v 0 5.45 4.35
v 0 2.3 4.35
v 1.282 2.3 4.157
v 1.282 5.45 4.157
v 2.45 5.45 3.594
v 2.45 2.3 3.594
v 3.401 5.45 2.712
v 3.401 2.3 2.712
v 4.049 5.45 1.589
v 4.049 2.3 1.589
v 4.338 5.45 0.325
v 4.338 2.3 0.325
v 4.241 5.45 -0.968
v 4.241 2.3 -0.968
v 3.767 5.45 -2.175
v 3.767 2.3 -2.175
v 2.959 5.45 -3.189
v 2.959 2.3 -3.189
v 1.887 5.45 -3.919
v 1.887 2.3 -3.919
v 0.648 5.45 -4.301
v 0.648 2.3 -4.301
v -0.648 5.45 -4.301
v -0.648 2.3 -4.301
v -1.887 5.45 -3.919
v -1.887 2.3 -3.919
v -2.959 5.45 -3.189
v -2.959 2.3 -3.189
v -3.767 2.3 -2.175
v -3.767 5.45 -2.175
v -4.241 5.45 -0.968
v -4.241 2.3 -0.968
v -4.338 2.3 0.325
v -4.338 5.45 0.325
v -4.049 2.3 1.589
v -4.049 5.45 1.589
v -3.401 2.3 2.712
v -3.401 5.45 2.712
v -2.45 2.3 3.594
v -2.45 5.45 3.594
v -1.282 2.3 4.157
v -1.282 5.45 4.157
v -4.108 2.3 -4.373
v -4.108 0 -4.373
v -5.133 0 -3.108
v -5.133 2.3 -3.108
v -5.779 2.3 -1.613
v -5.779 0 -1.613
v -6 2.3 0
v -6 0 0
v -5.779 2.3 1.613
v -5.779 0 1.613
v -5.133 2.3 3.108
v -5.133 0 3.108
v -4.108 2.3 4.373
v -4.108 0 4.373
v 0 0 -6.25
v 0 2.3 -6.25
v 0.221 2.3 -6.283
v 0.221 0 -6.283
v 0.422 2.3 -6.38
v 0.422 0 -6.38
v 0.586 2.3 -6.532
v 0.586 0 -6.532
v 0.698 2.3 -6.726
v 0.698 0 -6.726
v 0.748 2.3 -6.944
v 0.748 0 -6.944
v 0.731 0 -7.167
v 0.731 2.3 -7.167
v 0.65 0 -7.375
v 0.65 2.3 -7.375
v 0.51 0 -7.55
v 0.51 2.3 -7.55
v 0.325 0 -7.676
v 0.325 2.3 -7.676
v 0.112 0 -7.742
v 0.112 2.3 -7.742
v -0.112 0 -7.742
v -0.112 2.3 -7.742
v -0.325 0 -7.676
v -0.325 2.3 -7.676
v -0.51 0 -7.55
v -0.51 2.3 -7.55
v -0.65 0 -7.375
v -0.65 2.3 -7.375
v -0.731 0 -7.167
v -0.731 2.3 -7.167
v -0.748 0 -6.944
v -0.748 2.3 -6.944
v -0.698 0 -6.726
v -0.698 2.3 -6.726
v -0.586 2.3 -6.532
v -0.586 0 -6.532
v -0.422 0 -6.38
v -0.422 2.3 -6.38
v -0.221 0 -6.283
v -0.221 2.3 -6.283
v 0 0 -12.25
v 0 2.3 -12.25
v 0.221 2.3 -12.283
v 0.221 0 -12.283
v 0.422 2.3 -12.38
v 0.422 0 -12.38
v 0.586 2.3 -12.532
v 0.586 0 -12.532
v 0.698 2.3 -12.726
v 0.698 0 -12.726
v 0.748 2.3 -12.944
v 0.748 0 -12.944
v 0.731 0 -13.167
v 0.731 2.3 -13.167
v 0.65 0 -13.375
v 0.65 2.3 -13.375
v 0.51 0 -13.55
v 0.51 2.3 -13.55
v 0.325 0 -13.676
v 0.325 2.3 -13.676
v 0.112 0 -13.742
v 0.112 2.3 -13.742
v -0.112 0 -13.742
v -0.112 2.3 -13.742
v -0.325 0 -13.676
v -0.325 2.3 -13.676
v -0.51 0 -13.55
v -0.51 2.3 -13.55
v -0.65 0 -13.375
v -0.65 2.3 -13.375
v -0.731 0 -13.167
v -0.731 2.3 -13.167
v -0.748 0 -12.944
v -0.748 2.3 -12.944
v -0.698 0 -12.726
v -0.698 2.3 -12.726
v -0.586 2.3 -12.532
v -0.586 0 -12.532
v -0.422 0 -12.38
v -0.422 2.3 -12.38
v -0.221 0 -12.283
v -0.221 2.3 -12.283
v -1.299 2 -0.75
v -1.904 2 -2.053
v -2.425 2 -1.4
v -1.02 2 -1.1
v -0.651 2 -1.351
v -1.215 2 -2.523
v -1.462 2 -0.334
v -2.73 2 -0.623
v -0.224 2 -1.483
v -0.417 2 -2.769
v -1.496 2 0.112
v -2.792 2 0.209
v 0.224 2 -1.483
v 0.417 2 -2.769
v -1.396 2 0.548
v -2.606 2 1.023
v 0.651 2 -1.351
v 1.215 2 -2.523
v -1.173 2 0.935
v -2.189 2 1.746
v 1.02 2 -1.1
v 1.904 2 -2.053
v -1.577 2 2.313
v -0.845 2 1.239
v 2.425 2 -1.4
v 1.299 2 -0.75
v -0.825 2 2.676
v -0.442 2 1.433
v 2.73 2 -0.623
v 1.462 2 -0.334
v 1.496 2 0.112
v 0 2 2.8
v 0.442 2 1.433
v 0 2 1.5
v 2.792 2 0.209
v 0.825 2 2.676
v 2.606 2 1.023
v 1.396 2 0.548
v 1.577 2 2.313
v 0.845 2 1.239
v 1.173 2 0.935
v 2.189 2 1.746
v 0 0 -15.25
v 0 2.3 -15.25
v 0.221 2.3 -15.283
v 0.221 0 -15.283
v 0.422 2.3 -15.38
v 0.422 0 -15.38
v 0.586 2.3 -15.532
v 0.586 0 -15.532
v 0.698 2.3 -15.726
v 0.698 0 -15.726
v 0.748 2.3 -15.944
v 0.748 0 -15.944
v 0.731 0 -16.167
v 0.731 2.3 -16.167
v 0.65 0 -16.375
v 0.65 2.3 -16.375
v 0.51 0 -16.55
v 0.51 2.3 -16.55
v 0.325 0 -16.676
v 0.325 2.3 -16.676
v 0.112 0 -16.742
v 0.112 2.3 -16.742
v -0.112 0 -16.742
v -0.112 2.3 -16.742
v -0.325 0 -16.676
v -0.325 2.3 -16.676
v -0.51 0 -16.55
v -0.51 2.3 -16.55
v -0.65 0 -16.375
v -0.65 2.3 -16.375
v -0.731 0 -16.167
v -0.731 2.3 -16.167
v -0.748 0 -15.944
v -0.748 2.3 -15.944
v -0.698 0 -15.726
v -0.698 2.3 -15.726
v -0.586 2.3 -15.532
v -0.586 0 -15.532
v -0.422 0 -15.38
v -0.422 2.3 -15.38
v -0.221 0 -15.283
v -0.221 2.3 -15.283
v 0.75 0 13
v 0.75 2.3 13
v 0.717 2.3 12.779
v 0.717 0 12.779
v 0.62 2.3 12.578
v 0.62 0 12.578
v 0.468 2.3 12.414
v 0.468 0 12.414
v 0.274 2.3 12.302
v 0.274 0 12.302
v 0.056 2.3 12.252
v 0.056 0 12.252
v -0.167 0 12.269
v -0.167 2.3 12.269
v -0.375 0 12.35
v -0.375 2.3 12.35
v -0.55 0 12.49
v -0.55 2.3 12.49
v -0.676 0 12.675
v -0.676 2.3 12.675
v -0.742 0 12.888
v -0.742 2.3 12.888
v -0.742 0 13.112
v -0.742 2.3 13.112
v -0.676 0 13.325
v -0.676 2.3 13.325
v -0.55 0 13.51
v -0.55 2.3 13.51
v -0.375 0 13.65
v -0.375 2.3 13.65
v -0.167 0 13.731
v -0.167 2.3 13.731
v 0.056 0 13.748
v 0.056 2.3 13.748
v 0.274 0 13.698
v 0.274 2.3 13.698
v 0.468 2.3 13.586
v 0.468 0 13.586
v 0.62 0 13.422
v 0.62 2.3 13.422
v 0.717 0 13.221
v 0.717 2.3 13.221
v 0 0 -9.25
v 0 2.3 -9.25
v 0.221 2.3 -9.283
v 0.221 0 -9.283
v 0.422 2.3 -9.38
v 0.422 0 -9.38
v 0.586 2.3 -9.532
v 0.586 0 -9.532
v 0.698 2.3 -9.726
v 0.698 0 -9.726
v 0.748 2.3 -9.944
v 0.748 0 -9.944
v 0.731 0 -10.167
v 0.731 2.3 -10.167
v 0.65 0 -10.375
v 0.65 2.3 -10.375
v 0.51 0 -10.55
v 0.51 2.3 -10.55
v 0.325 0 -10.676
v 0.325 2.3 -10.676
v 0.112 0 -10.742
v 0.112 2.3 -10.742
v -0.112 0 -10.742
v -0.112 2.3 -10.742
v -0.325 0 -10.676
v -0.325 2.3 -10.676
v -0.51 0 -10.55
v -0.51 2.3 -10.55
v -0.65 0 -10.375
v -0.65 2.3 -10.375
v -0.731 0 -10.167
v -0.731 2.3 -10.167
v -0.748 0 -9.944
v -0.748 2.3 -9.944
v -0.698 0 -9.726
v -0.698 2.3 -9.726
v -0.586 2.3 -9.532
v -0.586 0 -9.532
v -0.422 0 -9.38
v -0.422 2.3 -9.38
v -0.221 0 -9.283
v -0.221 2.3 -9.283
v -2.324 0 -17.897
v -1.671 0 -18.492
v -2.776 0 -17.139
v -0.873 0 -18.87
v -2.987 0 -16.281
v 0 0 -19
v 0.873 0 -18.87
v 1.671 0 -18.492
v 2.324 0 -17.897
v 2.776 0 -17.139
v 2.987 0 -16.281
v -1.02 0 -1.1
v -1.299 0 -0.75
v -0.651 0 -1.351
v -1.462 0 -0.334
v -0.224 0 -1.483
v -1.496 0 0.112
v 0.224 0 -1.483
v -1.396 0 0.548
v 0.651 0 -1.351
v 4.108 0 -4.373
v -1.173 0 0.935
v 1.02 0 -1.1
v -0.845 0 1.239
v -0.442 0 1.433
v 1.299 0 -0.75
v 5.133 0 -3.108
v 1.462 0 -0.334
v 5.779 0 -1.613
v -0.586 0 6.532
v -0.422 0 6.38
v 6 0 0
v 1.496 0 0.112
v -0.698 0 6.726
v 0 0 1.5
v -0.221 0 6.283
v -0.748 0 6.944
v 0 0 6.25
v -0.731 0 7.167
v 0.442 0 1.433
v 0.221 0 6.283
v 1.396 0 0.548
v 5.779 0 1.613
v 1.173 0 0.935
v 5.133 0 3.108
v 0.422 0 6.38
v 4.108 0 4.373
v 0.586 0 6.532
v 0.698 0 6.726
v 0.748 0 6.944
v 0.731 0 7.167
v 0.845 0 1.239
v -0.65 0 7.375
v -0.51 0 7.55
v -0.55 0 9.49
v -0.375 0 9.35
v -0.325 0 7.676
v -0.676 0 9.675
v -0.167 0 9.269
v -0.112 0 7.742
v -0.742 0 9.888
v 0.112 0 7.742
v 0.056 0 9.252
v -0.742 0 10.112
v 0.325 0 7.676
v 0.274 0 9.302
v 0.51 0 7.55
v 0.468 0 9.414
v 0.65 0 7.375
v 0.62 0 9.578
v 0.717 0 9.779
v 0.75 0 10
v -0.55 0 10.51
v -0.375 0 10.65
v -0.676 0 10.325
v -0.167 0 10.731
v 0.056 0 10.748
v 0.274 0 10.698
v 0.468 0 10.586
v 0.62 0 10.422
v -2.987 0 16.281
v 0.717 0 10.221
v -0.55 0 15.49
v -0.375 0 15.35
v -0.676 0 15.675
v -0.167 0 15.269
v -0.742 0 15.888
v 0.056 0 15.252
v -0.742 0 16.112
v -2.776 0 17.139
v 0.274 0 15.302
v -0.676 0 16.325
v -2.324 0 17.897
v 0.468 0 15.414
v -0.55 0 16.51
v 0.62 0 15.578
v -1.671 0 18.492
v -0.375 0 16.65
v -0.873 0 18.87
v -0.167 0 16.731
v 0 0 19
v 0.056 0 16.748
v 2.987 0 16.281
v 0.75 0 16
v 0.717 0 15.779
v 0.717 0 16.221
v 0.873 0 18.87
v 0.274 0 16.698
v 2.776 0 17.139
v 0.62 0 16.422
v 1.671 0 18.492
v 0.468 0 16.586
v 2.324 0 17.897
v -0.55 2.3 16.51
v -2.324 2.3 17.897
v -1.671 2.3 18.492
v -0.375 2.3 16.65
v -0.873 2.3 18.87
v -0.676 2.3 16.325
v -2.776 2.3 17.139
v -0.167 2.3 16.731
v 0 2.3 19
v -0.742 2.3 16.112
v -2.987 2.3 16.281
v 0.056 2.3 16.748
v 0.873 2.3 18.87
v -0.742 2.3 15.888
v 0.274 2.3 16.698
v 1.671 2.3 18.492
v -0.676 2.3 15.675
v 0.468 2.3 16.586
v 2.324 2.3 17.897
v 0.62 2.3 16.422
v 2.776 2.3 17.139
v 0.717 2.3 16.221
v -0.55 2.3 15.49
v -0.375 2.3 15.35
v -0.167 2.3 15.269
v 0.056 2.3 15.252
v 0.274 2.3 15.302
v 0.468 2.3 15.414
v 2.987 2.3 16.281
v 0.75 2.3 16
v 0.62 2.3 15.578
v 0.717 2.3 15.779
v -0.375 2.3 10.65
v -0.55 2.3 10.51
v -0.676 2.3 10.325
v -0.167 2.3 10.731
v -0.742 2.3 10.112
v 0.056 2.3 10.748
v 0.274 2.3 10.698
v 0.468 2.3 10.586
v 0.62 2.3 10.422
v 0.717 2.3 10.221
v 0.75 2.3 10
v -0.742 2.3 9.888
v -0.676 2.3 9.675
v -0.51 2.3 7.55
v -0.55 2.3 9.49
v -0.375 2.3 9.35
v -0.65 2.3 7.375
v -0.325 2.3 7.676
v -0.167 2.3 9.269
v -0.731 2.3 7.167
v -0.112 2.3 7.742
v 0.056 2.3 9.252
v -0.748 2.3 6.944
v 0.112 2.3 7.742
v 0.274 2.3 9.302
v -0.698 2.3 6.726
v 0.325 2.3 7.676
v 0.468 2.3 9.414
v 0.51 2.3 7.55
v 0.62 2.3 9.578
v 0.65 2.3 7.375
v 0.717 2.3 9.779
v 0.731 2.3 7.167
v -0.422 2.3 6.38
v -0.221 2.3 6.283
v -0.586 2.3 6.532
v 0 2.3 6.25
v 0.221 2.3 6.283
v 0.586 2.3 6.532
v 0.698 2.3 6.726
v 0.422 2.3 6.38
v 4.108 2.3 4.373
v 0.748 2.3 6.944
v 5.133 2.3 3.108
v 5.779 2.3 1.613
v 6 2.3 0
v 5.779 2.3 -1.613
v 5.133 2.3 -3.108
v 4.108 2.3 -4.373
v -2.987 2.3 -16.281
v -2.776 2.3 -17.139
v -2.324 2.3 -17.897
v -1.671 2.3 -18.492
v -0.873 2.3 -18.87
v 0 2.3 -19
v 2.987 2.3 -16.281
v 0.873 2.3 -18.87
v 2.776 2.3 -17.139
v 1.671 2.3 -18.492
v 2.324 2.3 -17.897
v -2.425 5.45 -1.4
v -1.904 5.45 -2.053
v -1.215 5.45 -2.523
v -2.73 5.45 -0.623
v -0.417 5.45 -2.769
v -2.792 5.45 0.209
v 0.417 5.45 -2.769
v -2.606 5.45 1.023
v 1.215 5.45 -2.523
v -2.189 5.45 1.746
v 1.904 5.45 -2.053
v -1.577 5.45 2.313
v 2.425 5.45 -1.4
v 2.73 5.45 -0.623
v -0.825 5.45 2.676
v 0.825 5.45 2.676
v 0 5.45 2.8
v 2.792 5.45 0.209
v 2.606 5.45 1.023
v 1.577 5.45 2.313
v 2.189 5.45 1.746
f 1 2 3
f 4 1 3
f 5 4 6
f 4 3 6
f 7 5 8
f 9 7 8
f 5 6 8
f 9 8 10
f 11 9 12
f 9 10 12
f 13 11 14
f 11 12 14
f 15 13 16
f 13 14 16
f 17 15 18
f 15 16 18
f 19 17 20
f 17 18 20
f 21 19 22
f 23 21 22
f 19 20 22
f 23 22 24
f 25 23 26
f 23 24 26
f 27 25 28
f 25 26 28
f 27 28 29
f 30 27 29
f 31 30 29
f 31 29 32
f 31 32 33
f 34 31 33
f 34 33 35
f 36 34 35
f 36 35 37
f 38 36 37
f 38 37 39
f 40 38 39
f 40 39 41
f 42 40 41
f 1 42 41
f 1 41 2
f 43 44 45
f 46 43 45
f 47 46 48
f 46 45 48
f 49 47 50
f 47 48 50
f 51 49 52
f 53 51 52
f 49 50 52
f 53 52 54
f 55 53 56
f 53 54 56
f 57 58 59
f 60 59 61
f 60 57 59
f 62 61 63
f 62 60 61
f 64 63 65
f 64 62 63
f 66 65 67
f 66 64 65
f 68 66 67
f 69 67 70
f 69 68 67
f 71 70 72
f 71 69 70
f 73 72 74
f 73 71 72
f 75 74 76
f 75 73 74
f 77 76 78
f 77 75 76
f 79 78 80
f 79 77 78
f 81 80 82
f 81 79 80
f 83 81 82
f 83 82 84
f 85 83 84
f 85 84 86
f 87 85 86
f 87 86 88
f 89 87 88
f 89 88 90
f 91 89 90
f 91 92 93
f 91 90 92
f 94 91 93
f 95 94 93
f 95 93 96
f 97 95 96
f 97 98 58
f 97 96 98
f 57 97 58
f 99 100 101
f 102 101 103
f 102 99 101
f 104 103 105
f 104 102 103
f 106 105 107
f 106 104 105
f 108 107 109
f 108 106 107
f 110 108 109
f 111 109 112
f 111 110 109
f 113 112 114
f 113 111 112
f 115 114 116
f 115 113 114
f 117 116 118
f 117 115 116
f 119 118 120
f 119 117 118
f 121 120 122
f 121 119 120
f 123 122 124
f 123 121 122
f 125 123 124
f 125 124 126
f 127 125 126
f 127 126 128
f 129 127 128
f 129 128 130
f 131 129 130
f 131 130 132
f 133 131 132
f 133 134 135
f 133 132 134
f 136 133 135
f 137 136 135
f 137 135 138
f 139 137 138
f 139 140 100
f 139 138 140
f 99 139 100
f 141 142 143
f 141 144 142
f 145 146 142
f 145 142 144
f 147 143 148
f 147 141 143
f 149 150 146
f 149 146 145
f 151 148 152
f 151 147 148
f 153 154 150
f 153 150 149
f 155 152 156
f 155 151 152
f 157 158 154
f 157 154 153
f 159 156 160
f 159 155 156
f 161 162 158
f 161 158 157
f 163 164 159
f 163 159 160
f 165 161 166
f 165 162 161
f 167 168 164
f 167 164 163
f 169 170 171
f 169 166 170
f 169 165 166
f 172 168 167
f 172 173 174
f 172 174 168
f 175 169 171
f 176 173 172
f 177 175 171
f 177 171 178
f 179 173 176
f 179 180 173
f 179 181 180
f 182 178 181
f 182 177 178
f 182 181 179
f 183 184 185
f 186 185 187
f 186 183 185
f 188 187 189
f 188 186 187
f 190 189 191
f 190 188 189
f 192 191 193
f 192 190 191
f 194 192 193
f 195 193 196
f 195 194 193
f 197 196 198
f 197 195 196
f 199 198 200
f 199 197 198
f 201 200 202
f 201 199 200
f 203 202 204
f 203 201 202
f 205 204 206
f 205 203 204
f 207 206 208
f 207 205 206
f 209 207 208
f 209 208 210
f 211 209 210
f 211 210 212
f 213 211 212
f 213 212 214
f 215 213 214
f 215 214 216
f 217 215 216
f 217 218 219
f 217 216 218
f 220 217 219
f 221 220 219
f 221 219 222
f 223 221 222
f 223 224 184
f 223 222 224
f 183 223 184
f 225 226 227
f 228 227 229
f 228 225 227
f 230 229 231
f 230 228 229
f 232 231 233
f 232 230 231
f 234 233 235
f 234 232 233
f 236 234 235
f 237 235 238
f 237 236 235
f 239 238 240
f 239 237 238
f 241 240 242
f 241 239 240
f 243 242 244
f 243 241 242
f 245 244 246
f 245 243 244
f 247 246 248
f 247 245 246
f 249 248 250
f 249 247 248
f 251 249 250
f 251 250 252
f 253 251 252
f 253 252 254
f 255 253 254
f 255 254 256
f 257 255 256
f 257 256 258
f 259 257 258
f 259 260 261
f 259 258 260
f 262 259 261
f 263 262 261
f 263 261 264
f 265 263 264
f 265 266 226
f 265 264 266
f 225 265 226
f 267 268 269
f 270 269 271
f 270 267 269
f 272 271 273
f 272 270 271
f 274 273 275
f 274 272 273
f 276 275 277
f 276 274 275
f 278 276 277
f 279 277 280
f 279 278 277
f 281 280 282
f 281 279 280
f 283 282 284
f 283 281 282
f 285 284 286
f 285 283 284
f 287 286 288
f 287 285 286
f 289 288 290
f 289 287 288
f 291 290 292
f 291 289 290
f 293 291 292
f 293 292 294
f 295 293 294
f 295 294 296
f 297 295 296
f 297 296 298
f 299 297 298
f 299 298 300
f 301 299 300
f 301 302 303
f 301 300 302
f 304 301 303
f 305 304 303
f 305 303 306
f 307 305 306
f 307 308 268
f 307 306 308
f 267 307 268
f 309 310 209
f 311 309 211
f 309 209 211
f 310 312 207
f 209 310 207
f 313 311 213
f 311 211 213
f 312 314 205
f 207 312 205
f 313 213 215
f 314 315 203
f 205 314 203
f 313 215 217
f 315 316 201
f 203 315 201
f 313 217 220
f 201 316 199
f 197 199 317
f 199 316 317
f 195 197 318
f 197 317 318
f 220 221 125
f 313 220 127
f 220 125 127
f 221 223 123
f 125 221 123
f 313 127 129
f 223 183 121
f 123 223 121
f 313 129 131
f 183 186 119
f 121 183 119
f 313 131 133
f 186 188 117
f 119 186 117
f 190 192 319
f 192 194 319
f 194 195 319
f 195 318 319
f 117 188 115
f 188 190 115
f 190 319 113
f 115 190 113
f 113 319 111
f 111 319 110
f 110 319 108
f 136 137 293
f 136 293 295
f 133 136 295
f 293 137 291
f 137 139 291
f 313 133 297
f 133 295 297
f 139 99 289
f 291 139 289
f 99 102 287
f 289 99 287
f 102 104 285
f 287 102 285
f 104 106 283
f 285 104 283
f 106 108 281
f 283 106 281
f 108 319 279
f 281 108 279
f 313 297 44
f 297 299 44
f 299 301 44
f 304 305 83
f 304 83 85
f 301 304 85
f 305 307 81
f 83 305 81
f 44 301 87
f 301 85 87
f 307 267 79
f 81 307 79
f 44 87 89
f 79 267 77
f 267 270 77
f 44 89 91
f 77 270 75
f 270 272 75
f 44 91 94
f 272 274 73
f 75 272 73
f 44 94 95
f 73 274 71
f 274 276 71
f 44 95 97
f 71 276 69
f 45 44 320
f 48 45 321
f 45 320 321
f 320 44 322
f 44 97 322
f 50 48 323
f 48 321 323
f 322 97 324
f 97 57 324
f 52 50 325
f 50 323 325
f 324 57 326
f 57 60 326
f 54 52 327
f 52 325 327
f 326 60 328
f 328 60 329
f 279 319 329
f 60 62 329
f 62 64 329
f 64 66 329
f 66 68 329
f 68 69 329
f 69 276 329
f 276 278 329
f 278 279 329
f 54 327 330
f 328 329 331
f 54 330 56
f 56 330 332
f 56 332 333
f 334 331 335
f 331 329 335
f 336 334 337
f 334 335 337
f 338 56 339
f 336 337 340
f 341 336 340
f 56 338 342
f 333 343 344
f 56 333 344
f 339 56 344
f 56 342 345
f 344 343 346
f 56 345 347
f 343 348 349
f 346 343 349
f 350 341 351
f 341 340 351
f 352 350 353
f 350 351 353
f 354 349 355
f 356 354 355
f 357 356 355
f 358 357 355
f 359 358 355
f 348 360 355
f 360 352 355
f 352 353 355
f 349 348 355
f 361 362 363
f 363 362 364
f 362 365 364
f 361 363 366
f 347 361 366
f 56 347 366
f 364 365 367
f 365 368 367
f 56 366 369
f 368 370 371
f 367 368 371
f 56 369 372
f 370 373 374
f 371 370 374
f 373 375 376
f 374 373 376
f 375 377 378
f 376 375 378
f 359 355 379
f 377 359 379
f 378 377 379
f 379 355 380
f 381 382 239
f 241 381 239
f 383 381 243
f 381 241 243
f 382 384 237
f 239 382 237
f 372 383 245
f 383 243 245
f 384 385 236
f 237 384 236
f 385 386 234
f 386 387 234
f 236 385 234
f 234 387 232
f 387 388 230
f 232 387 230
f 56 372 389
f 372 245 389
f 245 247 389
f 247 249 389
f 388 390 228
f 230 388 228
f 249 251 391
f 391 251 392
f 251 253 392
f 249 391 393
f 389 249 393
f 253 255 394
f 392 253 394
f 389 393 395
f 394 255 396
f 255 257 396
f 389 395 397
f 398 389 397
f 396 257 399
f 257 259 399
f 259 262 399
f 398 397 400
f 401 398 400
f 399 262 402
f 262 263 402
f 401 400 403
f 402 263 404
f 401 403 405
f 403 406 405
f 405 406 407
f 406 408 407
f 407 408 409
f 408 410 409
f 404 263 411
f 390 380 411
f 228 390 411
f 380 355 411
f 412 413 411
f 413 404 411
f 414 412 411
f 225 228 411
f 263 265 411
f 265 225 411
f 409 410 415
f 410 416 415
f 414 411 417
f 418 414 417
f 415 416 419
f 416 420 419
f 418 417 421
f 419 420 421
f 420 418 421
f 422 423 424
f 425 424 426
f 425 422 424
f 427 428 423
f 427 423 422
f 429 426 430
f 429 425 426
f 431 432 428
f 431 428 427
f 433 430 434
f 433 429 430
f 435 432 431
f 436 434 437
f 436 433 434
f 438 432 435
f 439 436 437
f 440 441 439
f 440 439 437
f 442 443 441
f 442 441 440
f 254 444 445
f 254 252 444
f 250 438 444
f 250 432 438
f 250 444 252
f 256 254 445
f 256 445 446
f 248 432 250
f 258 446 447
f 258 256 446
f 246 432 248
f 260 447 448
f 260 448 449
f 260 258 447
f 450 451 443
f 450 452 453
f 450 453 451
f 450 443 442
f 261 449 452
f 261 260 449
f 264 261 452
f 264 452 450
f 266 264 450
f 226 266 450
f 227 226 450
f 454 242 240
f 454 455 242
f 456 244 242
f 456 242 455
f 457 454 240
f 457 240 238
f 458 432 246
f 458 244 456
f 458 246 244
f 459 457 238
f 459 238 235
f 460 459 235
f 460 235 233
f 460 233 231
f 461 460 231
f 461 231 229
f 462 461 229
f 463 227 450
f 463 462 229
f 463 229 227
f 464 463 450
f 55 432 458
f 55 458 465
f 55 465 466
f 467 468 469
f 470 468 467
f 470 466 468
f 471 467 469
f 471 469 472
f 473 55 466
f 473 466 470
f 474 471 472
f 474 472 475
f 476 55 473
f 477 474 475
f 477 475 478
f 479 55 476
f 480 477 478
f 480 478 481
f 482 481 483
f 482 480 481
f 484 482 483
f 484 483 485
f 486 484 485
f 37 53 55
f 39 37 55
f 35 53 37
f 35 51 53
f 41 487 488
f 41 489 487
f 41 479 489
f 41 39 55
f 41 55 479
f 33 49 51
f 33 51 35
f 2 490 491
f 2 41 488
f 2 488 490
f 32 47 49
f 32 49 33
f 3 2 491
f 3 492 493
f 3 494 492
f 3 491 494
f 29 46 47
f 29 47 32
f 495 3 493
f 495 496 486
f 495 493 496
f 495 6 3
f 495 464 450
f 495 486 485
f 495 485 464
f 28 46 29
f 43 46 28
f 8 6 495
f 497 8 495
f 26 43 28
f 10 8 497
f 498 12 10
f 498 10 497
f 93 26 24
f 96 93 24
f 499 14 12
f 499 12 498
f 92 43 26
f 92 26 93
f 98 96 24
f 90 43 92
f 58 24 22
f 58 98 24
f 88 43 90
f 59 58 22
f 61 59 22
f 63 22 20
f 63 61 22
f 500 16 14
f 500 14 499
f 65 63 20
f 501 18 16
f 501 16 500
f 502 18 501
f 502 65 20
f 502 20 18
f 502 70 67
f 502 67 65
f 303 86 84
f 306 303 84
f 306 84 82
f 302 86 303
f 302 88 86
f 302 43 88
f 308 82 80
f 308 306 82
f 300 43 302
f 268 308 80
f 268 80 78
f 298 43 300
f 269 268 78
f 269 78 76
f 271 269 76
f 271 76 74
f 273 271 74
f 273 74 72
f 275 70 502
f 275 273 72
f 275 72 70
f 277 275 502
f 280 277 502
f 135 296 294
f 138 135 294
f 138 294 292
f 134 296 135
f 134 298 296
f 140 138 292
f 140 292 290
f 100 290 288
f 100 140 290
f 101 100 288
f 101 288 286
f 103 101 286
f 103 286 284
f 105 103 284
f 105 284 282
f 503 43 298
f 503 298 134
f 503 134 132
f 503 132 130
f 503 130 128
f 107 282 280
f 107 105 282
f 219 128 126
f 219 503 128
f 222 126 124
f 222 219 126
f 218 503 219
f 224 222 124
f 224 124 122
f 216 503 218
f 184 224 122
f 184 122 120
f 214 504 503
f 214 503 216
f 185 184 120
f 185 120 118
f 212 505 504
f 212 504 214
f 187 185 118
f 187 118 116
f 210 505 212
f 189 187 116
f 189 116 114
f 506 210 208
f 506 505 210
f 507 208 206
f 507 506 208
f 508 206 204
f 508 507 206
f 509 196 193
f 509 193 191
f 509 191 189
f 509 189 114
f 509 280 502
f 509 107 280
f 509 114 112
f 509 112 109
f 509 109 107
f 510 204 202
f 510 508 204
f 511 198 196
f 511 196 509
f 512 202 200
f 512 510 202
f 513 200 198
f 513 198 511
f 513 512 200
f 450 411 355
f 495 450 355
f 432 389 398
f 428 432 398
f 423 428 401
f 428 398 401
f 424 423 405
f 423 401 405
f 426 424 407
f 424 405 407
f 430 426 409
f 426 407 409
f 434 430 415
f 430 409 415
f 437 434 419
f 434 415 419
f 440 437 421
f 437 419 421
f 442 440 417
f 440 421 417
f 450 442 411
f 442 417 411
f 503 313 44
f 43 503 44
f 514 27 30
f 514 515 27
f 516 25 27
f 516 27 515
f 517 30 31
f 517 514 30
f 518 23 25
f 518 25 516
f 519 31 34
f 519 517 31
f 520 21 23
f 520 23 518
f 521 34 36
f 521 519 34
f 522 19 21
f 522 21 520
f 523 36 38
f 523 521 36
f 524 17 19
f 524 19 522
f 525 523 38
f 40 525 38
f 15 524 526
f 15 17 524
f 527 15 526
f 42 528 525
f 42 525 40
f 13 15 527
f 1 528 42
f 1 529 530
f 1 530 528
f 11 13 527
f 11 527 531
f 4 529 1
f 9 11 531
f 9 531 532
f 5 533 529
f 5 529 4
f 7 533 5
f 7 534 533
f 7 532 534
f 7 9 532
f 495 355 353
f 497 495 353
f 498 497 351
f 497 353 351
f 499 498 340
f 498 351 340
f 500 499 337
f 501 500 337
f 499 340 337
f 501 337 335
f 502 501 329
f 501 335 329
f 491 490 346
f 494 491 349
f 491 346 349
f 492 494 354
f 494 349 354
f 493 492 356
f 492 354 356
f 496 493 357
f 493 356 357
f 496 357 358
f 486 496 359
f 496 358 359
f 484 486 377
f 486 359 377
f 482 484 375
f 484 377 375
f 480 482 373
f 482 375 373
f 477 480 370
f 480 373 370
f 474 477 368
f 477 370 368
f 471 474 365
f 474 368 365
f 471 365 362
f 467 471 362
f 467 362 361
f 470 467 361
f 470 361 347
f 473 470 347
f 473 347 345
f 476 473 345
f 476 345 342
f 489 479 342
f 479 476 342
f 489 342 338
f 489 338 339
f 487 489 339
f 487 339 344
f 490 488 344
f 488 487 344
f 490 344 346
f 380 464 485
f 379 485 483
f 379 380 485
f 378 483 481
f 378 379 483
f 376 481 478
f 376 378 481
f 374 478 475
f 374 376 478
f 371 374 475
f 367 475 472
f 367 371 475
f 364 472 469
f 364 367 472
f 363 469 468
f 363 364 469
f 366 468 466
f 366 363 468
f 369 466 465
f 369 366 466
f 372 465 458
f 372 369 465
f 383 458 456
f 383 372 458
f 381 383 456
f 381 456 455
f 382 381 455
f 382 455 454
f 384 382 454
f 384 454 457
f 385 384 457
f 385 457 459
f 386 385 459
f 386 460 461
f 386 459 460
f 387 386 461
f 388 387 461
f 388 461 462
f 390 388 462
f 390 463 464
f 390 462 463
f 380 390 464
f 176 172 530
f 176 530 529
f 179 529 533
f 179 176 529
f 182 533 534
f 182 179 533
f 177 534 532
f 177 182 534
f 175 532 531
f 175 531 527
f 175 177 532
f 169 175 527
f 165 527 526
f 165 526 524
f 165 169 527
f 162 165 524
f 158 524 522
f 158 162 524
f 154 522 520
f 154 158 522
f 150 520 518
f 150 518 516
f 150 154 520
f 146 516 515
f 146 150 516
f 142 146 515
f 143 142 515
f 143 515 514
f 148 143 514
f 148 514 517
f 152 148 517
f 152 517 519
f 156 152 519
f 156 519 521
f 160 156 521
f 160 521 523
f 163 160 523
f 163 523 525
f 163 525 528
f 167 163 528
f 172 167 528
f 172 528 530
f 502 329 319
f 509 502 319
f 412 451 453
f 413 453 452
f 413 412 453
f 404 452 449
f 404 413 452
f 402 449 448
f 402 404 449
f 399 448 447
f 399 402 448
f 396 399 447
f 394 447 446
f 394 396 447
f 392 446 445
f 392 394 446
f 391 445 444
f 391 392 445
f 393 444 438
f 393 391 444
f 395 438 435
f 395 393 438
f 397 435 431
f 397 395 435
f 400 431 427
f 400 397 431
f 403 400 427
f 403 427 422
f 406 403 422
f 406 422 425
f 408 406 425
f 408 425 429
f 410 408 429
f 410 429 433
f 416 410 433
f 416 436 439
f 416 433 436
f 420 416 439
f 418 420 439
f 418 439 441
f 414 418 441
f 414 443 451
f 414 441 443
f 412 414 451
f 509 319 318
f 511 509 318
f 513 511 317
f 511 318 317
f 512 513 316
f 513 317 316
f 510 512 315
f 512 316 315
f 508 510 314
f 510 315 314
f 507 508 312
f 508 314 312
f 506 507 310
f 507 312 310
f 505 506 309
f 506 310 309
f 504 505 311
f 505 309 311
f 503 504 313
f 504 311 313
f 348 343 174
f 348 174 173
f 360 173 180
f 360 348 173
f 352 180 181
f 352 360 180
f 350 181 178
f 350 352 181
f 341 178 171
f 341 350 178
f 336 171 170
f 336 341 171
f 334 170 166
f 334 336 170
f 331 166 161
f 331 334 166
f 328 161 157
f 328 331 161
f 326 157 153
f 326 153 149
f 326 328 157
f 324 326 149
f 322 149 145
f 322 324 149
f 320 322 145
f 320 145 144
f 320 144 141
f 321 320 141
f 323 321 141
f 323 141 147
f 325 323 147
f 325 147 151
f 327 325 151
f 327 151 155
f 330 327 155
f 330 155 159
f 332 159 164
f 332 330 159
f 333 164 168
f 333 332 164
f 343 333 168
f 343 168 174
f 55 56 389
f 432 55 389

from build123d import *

# Parameters (mm, degrees)
SKETCH1_R               = 4.35
SKETCH1_R_2             = 2.8
BOSS_EXTRUDE1_DEPTH     = 5.45
SKETCH2_R               = 4.35
BOSS_EXTRUDE2_DEPTH     = 2.3
CUT_EXTRUDE2_REACH      = 22.657
SKETCH3_R               = 0.75
LPATTERN1_COUNT         = 4
LPATTERN1_PITCH         = 3
MIRROR1_COPY_1_REACH    = 22.657
MIRROR1_COPY_1_SKETCH_R = 0.75
MIRROR1_COPY_2_REACH    = 22.657
MIRROR1_COPY_2_SKETCH_R = 0.75
MIRROR1_COPY_3_REACH    = 22.657
MIRROR1_COPY_3_SKETCH_R = 0.75
SKETCH5_R               = 2.8
SKETCH5_R_2             = 1.5
BOSS_EXTRUDE3_DEPTH     = 2


with BuildPart() as part:
    # Sketch1 → Boss-Extrude1 (new body)
    with BuildSketch(Plane(origin=(0, 0, 0), x_dir=(1, 0, 0), z_dir=(0, 1, 0))):
        with Locations(Location((0, 0, 0), (0, 0, 270))):
            Circle(SKETCH1_R)
        with Locations(Location((0, 0, 0), (0, 0, 270))):
            Circle(SKETCH1_R_2, mode=Mode.SUBTRACT)
    extrude(amount=BOSS_EXTRUDE1_DEPTH)

    # Sketch2 → Boss-Extrude2 (add)
    with BuildSketch(Plane(origin=(0, 0, 0), x_dir=(1, 0, 0), z_dir=(0, 1, 0))):
        with BuildLine():
            ThreePointArc((2.98678731, 16.28125), (0, 19), (-2.98678731, 16.28125))
            Line((-2.98678731, 16.28125), (-4.108122187, 4.373023221))
            ThreePointArc((-4.108122187, 4.373023221), (-6, 0), (-4.108122187, -4.373023221))
            Line((-4.108122187, -4.373023221), (-2.98678731, -16.28125))
            ThreePointArc((-2.98678731, -16.28125), (0, -19), (2.98678731, -16.28125))
            Line((2.98678731, -16.28125), (4.108122187, -4.373023221))
            ThreePointArc((4.108122187, -4.373023221), (6, 0), (4.108122187, 4.373023221))
            Line((4.108122187, 4.373023221), (2.98678731, 16.28125))
        make_face()
        with Locations(Location((0, 0, 0), (0, 0, 270))):
            Circle(SKETCH2_R, mode=Mode.SUBTRACT)
    extrude(amount=BOSS_EXTRUDE2_DEPTH)

    # Sketch3 → Cut-Extrude2 (cut, up to next)
    with BuildSketch(Plane(origin=(0, 0, 0), x_dir=(1, 0, 0), z_dir=(0, 1, 0)), mode=Mode.PRIVATE) as cut_extrude2_sk1:
        with Locations(Location((0, 7, 0), (0, 0, 270))):
            Circle(SKETCH3_R)
    cut_extrude2_tool1 = extrude(cut_extrude2_sk1.sketch, amount=CUT_EXTRUDE2_REACH, mode=Mode.PRIVATE) & part.part
    cut_extrude2 = cut_extrude2_tool1.solids().sort_by_distance((0, 0, -7))[0]
    add(cut_extrude2, mode=Mode.SUBTRACT)

    # LPattern1: Cut-Extrude2 ×4
    with Locations(*[(0, 0, -i * LPATTERN1_PITCH) for i in range(1, LPATTERN1_COUNT)]):
        add(cut_extrude2, mode=Mode.SUBTRACT)

    # Mirror1: Cut-Extrude2 across plane
    add(cut_extrude2.mirror(Plane.XY), mode=Mode.SUBTRACT)

    # Mirror1 copy 1 sketch → Mirror1 copy 1 (cut, up to next)
    with BuildSketch(Plane(origin=(0, 0, 3), x_dir=(1, 0, 0), z_dir=(0, 1, 0)), mode=Mode.PRIVATE) as mirror1_copy_1_sk1:
        with Locations((0, -7)):
            Circle(MIRROR1_COPY_1_SKETCH_R)
    mirror1_copy_1_tool1 = extrude(mirror1_copy_1_sk1.sketch, amount=MIRROR1_COPY_1_REACH, mode=Mode.PRIVATE) & part.part
    add(mirror1_copy_1_tool1.solids().sort_by_distance((0, 0, 10))[0], mode=Mode.SUBTRACT)

    # Mirror1 copy 2 sketch → Mirror1 copy 2 (cut, up to next)
    with BuildSketch(Plane(origin=(0, 0, 6), x_dir=(1, 0, 0), z_dir=(0, 1, 0)), mode=Mode.PRIVATE) as mirror1_copy_2_sk1:
        with Locations((0, -7)):
            Circle(MIRROR1_COPY_2_SKETCH_R)
    mirror1_copy_2_tool1 = extrude(mirror1_copy_2_sk1.sketch, amount=MIRROR1_COPY_2_REACH, mode=Mode.PRIVATE) & part.part
    add(mirror1_copy_2_tool1.solids().sort_by_distance((0, 0, 13))[0], mode=Mode.SUBTRACT)

    # Mirror1 copy 3 sketch → Mirror1 copy 3 (cut, up to next)
    with BuildSketch(Plane(origin=(0, 0, 9), x_dir=(1, 0, 0), z_dir=(0, 1, 0)), mode=Mode.PRIVATE) as mirror1_copy_3_sk1:
        with Locations((0, -7)):
            Circle(MIRROR1_COPY_3_SKETCH_R)
    mirror1_copy_3_tool1 = extrude(mirror1_copy_3_sk1.sketch, amount=MIRROR1_COPY_3_REACH, mode=Mode.PRIVATE) & part.part
    add(mirror1_copy_3_tool1.solids().sort_by_distance((0, 0, 16))[0], mode=Mode.SUBTRACT)

    # Sketch5 → Boss-Extrude3 (add)
    with BuildSketch(Plane(origin=(0, 0, 0), x_dir=(1, 0, 0), z_dir=(0, 1, 0))):
        with Locations(Location((0, 0, 0), (0, 0, 270))):
            Circle(SKETCH5_R)
        with Locations(Location((0, 0, 0), (0, 0, 270))):
            Circle(SKETCH5_R_2, mode=Mode.SUBTRACT)
    extrude(amount=BOSS_EXTRUDE3_DEPTH)


solid = part.part
